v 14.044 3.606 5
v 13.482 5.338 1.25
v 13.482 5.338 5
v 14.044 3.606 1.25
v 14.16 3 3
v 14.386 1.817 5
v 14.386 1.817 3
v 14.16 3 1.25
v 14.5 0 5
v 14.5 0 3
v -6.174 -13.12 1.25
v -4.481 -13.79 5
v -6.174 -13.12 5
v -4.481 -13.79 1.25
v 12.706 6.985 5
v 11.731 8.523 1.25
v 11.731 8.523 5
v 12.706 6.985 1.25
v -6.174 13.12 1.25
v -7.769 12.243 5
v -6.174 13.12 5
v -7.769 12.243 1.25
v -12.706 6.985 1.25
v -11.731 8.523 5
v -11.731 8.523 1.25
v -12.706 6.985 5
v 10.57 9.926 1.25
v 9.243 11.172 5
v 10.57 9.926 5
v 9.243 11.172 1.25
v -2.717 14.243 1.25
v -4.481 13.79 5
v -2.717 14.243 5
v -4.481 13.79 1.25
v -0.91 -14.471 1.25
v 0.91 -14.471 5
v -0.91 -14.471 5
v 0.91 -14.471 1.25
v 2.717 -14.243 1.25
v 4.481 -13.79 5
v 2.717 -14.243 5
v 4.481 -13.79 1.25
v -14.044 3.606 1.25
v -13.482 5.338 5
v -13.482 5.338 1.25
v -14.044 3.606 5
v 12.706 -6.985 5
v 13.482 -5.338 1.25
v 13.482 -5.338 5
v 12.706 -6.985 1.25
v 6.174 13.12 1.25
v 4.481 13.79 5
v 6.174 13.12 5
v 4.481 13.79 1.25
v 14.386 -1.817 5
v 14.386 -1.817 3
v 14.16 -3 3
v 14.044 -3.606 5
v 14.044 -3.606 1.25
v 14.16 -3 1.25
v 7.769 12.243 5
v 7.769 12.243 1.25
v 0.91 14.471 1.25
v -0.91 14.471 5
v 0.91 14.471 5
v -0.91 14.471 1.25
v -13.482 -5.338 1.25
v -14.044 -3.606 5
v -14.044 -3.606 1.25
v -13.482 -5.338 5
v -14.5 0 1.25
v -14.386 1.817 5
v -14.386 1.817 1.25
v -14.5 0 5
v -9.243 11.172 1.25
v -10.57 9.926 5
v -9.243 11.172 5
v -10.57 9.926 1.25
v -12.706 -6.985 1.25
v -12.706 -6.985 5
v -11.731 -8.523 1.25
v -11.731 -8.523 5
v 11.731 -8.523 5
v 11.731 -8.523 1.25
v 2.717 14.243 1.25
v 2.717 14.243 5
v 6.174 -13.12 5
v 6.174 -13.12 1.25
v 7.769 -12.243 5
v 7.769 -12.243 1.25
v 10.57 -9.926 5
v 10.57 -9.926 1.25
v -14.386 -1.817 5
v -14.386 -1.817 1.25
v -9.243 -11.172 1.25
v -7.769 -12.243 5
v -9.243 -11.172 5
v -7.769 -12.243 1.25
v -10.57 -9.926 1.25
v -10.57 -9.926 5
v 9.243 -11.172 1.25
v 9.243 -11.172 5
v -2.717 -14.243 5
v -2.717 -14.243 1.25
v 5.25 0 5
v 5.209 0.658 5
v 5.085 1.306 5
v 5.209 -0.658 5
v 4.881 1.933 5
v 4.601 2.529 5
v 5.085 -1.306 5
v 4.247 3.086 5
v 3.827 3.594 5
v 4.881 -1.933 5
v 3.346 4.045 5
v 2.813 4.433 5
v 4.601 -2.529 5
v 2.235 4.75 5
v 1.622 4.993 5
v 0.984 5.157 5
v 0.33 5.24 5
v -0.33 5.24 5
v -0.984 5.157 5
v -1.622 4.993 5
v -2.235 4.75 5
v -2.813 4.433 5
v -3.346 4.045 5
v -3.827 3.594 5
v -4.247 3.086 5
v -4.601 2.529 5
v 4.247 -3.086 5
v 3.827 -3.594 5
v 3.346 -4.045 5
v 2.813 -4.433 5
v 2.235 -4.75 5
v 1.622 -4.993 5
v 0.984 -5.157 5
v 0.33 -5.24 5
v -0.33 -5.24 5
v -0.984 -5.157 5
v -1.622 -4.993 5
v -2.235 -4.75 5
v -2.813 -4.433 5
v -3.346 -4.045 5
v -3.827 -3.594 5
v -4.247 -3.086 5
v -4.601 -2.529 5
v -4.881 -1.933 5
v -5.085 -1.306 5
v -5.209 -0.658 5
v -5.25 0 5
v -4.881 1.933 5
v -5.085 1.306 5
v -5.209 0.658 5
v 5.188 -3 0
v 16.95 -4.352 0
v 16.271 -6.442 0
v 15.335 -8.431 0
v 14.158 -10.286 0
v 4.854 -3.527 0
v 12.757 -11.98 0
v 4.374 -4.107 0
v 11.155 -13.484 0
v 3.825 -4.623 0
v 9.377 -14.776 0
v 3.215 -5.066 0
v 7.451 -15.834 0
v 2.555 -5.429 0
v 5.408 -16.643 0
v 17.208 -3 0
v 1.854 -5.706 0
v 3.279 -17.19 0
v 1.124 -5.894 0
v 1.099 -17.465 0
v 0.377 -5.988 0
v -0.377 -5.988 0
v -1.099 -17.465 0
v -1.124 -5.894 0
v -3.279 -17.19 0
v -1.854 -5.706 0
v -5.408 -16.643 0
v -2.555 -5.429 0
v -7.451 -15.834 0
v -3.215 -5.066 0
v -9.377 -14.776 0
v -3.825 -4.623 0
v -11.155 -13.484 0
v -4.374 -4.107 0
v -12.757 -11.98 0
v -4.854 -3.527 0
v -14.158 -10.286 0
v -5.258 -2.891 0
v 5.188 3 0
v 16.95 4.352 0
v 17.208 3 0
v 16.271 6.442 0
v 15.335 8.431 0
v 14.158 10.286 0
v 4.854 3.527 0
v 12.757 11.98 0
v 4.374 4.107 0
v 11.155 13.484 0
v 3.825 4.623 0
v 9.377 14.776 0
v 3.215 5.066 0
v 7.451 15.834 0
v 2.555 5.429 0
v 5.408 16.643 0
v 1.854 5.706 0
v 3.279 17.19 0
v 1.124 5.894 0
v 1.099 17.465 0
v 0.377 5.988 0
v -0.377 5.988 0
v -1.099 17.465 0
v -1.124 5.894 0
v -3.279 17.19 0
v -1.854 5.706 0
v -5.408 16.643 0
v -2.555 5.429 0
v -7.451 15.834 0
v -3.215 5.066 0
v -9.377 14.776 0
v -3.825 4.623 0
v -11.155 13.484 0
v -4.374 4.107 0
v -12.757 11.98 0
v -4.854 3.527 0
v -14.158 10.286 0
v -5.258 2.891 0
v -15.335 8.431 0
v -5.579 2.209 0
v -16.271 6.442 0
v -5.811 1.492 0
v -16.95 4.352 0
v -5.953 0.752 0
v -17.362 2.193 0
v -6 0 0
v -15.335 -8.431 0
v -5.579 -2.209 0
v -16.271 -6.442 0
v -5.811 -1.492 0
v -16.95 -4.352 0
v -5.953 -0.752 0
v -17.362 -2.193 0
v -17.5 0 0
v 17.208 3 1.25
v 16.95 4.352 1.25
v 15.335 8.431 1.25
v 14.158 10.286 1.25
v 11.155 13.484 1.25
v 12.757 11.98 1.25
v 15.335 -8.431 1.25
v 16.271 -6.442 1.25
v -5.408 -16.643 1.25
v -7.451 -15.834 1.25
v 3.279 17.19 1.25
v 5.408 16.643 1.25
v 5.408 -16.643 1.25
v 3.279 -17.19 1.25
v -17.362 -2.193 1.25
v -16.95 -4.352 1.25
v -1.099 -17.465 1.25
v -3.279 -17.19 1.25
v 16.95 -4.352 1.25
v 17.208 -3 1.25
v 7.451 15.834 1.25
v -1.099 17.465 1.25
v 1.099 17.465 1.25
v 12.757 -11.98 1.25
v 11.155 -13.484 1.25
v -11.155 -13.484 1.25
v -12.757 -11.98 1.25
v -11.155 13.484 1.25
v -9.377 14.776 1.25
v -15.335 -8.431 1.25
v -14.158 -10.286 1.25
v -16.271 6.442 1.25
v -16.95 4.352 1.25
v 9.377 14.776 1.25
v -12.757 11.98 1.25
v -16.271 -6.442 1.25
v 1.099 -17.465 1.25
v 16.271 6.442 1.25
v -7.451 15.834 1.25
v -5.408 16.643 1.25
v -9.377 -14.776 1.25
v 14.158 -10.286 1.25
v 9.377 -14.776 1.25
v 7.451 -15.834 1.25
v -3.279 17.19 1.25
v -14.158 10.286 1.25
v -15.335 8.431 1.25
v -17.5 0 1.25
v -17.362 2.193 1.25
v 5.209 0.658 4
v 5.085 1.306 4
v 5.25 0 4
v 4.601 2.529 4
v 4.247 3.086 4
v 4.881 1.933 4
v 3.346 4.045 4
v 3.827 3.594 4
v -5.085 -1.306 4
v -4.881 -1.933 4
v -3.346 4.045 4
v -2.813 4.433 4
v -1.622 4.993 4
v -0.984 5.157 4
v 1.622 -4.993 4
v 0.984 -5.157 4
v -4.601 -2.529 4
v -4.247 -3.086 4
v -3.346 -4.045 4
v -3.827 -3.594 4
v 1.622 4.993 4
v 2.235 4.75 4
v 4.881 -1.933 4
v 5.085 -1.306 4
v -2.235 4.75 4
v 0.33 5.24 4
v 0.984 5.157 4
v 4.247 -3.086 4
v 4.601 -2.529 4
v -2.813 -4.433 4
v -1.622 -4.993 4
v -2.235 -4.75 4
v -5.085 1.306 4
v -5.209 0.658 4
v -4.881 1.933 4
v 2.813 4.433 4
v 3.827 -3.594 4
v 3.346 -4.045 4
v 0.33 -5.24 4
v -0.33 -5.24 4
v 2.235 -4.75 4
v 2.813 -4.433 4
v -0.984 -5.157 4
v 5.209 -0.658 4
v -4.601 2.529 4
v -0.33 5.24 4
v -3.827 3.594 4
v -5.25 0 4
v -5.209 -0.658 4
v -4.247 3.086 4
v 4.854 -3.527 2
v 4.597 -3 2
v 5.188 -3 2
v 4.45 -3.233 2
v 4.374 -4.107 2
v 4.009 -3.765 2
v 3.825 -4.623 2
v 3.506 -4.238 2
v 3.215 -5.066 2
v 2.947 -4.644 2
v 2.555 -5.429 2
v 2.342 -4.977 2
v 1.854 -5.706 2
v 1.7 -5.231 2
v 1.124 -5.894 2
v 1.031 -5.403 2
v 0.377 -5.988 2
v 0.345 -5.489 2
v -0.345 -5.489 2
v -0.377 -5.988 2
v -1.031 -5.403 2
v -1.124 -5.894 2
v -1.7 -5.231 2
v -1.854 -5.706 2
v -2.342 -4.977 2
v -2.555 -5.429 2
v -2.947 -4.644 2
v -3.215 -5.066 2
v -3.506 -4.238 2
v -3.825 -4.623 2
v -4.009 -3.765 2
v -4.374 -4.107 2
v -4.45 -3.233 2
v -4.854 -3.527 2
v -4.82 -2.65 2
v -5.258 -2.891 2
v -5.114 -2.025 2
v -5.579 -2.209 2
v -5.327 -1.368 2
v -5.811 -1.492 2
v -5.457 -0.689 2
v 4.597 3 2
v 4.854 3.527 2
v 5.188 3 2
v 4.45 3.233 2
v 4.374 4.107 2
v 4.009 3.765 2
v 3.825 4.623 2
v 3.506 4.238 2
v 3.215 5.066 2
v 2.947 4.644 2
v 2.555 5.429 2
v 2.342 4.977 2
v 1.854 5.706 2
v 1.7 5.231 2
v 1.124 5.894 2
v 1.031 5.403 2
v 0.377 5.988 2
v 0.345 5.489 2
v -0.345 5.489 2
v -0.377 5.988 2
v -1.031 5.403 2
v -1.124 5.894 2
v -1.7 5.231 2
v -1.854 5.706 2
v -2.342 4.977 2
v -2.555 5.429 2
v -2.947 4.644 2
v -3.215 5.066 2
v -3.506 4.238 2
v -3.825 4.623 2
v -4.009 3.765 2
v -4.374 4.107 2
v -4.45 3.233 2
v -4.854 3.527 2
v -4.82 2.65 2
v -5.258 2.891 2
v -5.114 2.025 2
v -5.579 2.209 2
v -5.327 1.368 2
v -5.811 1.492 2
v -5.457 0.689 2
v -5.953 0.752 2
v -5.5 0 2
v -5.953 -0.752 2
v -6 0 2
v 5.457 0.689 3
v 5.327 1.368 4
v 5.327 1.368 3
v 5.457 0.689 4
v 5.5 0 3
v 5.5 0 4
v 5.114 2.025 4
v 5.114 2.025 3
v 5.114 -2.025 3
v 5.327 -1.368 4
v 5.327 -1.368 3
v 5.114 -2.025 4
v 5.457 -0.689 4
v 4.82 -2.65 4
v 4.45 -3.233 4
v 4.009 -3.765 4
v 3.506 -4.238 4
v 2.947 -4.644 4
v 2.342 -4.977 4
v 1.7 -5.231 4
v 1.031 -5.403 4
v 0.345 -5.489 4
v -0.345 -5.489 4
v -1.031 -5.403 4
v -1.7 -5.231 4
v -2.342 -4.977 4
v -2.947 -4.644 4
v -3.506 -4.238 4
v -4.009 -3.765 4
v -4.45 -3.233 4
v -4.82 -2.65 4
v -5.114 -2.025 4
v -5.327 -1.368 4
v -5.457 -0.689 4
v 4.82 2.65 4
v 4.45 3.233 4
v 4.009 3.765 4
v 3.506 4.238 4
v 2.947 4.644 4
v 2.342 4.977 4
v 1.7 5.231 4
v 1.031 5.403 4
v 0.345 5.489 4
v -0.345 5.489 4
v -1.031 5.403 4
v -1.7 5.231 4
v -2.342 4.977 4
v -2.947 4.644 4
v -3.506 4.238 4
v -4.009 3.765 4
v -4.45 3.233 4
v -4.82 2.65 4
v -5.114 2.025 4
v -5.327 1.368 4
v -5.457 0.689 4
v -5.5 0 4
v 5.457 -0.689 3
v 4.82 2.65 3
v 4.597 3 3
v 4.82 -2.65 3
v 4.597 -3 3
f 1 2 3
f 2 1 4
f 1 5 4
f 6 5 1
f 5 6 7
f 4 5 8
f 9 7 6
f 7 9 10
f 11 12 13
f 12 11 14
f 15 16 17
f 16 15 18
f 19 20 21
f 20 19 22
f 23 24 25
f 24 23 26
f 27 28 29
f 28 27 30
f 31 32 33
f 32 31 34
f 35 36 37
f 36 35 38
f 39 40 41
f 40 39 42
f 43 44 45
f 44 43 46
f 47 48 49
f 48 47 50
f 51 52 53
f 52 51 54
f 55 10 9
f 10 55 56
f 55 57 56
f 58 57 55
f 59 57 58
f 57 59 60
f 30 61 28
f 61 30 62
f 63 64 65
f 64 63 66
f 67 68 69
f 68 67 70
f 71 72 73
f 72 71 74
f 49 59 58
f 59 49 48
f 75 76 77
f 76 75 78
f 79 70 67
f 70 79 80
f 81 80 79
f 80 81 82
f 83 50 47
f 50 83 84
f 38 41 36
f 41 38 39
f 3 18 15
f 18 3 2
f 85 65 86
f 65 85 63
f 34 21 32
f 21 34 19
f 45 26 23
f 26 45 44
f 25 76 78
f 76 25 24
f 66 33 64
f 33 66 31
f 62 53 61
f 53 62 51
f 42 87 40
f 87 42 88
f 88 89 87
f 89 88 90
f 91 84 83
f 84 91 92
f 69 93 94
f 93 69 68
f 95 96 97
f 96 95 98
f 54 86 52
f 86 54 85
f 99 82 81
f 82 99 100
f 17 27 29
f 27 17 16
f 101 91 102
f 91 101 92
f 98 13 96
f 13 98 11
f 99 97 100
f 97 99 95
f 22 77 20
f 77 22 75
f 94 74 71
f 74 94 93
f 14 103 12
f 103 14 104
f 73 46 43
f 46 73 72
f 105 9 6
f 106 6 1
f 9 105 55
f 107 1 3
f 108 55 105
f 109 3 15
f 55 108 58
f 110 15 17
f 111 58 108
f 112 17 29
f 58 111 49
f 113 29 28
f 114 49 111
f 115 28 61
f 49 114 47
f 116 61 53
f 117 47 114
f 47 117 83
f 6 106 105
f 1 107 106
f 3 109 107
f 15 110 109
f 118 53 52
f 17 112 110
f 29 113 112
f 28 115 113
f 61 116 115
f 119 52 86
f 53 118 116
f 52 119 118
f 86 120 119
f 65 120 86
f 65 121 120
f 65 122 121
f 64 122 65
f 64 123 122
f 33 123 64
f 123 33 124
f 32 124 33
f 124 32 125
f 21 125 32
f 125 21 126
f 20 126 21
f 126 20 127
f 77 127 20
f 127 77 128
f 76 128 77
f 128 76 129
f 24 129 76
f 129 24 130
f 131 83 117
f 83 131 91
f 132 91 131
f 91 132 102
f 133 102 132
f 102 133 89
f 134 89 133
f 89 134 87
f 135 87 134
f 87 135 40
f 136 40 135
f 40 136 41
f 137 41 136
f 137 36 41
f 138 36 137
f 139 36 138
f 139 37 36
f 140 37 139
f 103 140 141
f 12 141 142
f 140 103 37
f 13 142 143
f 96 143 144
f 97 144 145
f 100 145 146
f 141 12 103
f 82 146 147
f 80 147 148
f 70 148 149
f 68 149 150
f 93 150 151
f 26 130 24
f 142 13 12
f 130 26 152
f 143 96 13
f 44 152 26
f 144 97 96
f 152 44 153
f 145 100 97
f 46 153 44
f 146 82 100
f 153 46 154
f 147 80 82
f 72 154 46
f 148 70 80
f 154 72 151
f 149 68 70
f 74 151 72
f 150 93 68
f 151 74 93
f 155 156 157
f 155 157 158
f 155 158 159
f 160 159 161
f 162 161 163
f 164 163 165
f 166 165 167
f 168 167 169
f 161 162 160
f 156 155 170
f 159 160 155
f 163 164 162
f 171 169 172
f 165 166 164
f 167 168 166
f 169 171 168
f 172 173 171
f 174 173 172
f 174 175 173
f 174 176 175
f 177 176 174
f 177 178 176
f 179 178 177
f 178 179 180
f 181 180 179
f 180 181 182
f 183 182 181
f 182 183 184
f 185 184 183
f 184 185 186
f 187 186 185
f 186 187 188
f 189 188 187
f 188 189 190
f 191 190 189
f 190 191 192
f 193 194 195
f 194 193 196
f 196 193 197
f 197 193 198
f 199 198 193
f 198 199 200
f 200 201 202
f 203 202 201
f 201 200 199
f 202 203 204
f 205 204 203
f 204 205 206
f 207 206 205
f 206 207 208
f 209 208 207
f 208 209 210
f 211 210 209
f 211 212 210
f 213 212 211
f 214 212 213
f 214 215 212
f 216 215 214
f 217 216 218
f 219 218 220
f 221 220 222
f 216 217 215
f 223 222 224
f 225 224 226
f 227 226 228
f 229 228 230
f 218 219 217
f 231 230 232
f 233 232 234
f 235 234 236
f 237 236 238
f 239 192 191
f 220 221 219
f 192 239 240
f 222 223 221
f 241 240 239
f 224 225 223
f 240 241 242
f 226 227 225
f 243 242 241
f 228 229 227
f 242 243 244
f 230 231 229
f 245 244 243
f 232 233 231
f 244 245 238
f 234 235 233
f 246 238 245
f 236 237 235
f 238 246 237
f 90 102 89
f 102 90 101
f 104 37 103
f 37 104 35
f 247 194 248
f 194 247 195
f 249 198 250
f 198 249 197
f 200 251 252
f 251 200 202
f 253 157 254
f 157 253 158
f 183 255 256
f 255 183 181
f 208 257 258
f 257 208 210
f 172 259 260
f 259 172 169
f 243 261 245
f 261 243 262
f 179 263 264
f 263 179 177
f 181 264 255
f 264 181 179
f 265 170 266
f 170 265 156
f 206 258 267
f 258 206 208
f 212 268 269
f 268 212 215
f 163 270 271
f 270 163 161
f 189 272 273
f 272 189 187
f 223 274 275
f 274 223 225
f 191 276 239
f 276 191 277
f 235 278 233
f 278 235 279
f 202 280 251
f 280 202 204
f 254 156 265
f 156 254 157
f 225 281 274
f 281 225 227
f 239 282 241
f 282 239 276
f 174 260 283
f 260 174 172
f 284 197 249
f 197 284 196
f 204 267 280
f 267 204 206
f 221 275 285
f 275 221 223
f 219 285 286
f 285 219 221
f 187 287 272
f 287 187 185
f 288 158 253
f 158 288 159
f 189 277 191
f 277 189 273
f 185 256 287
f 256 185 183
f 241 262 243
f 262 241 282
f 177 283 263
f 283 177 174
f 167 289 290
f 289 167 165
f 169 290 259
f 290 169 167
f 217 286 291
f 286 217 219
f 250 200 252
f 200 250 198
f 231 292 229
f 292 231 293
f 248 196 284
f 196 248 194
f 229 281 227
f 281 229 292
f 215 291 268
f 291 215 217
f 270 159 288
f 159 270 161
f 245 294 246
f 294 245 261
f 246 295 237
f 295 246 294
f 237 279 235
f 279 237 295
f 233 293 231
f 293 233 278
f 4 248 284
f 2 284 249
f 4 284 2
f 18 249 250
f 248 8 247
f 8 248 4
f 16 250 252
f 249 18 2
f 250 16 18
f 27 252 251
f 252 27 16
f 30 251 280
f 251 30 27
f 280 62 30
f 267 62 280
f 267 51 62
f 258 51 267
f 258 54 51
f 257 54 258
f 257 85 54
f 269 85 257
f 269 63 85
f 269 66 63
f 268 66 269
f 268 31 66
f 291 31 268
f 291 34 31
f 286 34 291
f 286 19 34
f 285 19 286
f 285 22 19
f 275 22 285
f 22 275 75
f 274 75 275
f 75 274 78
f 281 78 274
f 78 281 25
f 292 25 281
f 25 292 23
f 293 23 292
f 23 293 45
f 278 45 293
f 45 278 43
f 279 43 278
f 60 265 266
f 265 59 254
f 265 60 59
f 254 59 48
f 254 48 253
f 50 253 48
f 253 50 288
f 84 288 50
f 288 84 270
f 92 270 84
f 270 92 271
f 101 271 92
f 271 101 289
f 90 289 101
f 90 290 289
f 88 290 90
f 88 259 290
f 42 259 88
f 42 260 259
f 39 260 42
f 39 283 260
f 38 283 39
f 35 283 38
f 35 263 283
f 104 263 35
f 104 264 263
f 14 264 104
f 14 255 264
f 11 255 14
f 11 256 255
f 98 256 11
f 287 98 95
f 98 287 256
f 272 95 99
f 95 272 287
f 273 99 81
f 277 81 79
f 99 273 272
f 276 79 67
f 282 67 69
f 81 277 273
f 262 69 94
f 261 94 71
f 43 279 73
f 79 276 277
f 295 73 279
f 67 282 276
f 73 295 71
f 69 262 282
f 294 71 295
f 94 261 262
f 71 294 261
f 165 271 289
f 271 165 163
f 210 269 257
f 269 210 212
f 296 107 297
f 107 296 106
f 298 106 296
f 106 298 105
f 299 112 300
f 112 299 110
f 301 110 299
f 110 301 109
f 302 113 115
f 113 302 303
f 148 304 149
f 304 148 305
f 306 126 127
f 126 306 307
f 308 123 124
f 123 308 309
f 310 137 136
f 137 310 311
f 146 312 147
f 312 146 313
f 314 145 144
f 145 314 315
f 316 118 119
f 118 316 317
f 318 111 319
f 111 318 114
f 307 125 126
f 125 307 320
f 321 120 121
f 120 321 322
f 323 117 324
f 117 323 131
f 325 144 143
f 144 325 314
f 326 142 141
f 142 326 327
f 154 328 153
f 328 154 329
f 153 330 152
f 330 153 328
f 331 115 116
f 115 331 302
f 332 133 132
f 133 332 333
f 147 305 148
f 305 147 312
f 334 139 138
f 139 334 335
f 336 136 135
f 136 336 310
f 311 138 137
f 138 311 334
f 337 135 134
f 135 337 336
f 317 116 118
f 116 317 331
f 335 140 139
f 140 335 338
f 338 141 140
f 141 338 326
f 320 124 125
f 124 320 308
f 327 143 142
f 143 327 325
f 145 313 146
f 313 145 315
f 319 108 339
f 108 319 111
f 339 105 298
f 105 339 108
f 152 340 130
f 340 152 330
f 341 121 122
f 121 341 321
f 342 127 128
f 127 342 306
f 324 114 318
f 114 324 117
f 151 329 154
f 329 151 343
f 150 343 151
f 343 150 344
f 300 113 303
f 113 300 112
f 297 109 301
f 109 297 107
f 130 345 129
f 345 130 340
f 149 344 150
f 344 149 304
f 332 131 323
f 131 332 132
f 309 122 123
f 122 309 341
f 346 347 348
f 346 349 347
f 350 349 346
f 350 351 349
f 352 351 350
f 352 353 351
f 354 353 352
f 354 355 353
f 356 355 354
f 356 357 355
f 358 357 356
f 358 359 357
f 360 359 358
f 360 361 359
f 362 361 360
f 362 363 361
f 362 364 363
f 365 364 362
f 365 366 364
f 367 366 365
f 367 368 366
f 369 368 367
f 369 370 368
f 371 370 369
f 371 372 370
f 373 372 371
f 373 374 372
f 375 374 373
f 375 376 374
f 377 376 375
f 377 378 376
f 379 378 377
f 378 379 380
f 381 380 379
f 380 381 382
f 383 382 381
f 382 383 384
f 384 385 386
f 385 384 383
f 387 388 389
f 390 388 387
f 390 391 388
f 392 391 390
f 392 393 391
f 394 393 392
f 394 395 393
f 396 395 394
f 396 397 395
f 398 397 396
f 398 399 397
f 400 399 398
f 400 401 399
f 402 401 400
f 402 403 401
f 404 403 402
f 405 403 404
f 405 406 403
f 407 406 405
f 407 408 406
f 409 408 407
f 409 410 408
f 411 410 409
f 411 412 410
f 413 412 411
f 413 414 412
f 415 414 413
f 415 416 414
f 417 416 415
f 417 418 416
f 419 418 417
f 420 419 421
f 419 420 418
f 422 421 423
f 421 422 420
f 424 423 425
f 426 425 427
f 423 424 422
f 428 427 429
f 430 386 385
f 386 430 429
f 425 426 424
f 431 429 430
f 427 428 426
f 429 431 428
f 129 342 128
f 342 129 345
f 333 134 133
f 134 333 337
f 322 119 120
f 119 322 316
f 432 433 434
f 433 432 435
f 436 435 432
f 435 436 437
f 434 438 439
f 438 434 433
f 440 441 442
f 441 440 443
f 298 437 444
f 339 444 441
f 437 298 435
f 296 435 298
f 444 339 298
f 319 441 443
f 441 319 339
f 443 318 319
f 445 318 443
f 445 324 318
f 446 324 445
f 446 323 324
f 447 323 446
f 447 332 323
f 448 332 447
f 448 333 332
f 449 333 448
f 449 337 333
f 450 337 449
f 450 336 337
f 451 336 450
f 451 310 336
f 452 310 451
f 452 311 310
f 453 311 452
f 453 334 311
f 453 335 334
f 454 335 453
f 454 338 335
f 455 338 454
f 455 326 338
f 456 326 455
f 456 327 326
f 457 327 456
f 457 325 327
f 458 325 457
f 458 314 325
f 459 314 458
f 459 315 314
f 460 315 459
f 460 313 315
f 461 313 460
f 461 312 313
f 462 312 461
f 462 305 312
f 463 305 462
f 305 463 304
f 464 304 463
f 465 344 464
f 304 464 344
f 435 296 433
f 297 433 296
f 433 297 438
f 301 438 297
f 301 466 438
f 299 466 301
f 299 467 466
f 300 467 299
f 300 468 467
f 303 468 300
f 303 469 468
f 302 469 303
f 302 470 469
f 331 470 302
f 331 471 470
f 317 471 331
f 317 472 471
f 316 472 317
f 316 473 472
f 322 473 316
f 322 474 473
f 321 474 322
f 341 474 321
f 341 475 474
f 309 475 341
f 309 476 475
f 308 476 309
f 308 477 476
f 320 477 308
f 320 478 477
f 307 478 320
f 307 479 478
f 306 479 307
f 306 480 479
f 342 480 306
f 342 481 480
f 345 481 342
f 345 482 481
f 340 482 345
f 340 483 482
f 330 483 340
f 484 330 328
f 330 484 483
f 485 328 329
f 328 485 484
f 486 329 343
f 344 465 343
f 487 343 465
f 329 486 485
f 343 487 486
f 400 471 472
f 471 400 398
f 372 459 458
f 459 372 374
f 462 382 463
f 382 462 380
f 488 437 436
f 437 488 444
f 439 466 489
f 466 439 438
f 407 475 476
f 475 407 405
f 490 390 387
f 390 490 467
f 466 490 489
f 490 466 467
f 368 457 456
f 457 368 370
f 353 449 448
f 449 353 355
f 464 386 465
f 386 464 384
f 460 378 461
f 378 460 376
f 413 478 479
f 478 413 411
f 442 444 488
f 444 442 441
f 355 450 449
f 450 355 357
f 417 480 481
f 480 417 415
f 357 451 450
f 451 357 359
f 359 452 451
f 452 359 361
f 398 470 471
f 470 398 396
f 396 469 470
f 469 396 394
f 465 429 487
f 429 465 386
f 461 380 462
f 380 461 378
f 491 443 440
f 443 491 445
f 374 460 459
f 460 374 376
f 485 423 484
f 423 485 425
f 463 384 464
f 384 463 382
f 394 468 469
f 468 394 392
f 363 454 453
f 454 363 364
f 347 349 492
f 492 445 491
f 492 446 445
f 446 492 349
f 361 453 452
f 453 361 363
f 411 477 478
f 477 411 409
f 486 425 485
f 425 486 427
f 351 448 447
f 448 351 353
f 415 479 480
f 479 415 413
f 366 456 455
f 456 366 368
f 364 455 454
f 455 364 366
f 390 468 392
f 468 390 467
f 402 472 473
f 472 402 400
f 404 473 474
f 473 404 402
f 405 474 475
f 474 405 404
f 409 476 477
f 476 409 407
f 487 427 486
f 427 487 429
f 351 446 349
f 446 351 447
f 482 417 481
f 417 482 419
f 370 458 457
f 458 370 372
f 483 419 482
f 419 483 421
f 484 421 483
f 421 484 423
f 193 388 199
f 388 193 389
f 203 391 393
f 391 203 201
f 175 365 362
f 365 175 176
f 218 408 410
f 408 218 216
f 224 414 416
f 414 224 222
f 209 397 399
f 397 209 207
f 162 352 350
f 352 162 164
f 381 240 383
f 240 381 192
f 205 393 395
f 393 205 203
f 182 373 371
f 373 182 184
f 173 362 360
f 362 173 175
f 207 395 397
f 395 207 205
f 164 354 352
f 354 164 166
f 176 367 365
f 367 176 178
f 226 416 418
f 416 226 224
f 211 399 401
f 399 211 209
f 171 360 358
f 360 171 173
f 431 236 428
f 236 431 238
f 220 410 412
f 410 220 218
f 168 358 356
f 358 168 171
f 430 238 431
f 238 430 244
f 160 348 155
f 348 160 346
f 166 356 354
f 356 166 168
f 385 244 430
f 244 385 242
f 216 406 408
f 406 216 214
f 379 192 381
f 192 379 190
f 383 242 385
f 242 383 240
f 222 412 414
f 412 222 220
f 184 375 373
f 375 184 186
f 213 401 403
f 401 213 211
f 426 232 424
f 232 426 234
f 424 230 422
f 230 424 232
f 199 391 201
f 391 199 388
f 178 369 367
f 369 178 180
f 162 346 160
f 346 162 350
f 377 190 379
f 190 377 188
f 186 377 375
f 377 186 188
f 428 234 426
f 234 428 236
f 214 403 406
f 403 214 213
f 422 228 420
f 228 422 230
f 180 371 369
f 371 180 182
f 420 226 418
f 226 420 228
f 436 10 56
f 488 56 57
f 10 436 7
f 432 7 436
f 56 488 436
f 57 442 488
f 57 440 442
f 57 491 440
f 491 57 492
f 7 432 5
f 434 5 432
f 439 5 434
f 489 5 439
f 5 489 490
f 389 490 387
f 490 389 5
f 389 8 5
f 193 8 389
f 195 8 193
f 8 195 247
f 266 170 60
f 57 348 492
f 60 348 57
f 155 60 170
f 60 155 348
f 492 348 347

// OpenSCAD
// file: ../components/led.scad
module led(diameter, height, tolerance){
    
    // Add tolerance.
    total_diameter = diameter+tolerance;
    
    // Derive remaining dimensions from the overall measurements.
    lip_radius = total_diameter/2;
    lip_height = 2; // TODO: this probably shouldn't be hard-coded.
    body_radius = (total_diameter-.5)/2;
    dome_radius = body_radius;
    body_height = height-dome_radius;
    
    color("red"){
        // Body.
        cylinder(r=body_radius,h=body_height);
        // Lip.
        cylinder(r=lip_radius,h=lip_height);
        // Dome.
        //translate([0,0,LED_HEIGHT-(LED_DIAMETER/2)]){
        translate([0,0,height-body_radius]){
            sphere(r=dome_radius);
        }
    }
    // Leads.
    color("gray"){
        translate([0,2,-10]){
            cylinder(r=.5,h=10);
        }
        translate([0,-2,-12]){
            cylinder(r=.5,h=12);
        }
    }
}

// Example.
//led(10,13.7,1);
// main file
include <../components/led.scad>

OPENING_RADIUS = 29;    // Probably 30 but it's ceramic and there's glue so...
COVER_RADIUS = 35;      // Radius of the original battery/light holder.
COVER_DEPTH = 1.25;
MAX_DEPTH = 120;        // The max depth at the opening radius (roughly).

$fn=50;
difference(){
    union(){
        cylinder(r=OPENING_RADIUS/2,h=5);
        cylinder(r=COVER_RADIUS/2,h=COVER_DEPTH);
    }
    
    cylinder(r=12/2,h=2);
    translate([0,0,2]){
        #led(10,13.7,1);
    }
    
    translate([0,-3,0]){
        #cube([20,6,3]);
    }
}
